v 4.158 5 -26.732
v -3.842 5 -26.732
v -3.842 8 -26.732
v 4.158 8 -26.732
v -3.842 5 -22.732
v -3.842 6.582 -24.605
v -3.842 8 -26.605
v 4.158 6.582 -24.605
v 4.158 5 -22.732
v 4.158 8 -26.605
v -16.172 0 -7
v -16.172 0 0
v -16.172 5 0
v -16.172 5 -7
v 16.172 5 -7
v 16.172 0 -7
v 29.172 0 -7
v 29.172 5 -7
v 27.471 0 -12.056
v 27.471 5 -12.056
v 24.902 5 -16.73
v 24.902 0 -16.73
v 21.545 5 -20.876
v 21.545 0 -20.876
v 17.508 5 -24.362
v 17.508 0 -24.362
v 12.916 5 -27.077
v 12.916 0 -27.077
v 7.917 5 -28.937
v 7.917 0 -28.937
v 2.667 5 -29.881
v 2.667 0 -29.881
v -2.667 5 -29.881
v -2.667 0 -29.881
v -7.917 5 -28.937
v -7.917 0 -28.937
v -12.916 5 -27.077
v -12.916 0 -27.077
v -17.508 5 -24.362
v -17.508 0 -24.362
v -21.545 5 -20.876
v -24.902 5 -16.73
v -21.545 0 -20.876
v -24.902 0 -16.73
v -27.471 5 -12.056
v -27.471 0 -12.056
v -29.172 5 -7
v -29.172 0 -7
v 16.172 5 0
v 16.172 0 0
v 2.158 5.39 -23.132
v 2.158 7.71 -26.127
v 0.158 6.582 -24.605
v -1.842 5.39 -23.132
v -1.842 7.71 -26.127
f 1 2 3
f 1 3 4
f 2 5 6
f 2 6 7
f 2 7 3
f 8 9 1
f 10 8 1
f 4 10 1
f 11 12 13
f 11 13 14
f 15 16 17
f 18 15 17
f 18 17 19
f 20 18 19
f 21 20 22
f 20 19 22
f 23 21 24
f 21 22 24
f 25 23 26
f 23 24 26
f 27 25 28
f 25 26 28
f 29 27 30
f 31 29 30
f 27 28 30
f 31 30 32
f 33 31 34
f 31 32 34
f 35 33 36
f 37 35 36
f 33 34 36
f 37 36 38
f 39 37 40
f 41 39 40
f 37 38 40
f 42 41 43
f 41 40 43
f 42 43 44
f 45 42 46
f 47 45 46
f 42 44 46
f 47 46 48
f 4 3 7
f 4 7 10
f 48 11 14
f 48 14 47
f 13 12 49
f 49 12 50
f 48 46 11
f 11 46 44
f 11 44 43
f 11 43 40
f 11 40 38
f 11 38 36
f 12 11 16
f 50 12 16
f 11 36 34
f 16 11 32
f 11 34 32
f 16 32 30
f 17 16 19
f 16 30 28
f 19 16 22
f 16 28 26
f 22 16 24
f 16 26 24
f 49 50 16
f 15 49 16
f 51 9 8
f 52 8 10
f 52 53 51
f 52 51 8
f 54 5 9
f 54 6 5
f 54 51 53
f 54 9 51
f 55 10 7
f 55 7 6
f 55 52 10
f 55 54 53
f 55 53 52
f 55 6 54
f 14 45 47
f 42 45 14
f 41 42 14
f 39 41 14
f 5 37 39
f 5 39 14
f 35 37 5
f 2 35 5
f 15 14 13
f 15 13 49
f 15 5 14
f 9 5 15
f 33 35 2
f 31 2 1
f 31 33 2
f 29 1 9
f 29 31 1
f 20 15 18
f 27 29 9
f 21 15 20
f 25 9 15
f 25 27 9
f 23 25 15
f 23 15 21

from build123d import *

# Parameters (mm, degrees)
BOSS_EXTRUDE1_DEPTH = 5
SKETCH3_W           = 8
SKETCH3_H           = 4
BOSS_EXTRUDE2_DEPTH = 3
FILLET1_START       = -3.841593316
FILLET1_DEPTH       = 8
CUT_EXTRUDE1_START  = -10
CUT_EXTRUDE1_DEPTH  = 10


with BuildPart() as part:
    # Sketch1 → Boss-Extrude1 (new body)
    with BuildSketch(Plane(origin=(0, 0, 0), x_dir=(1, 0, 0), z_dir=(0, 1, 0))):
        with BuildLine():
            Line((-30, 0), (30, 0))
            ThreePointArc((30, 0), (0, 30), (-30, 0))
        make_face()
    extrude(amount=BOSS_EXTRUDE1_DEPTH)

    # Sketch3 → Boss-Extrude2 (add)
    with BuildSketch(Plane(origin=(0, 5, 0), x_dir=(1, 0, 0), z_dir=(0, 1, 0))):
        with Locations((0.158406684, 24.731666579)):
            Rectangle(SKETCH3_W, SKETCH3_H)
    extrude(amount=BOSS_EXTRUDE2_DEPTH)

    # Fillet1: read off the stored shape, not the designer's step
    # Fillet1 outline → Fillet1 (cut)
    with BuildSketch(Plane.YZ.offset(FILLET1_START)):
        with BuildLine():
            Line((8, -22.731666579), (5, -22.731666579))
            add(Edge.make_bspline(
                [(5, -22.731666579), (8, -23.506263249), (8, -26.604649926)],
                knots=[0, 0, 0, 1, 1, 1], degree=2, weights=[1, 0.057495957, 1]))
            Line((8, -26.604649926), (8, -22.731666579))
        make_face()
    extrude(amount=FILLET1_DEPTH, mode=Mode.SUBTRACT)

    # Sketch5 → Cut-Extrude1 (cut)
    with BuildSketch(Plane(origin=(0, 5, 0), x_dir=(1, 0, 0), z_dir=(0, 1, 0)).offset(CUT_EXTRUDE1_START)):
        with BuildLine():
            Line((-16.171904292, 0), (-16.171904292, 7))
            Line((-16.171904292, 7), (-29.171904292, 7))
            ThreePointArc((-29.171904292, 7), (-29.792256786, 3.524405712), (-30, 0))
            Line((-30, 0), (-16.171904292, 0))
        make_face()
        with BuildLine():
            Line((16.171904292, 7), (29.171904292, 7))
            ThreePointArc((29.171904292, 7), (29.792256786, 3.524405712), (30, 0))
            Line((30, 0), (16.171904292, 0))
            Line((16.171904292, 0), (16.171904292, 7))
        make_face()
    extrude(amount=CUT_EXTRUDE1_DEPTH, mode=Mode.SUBTRACT)


solid = part.part
